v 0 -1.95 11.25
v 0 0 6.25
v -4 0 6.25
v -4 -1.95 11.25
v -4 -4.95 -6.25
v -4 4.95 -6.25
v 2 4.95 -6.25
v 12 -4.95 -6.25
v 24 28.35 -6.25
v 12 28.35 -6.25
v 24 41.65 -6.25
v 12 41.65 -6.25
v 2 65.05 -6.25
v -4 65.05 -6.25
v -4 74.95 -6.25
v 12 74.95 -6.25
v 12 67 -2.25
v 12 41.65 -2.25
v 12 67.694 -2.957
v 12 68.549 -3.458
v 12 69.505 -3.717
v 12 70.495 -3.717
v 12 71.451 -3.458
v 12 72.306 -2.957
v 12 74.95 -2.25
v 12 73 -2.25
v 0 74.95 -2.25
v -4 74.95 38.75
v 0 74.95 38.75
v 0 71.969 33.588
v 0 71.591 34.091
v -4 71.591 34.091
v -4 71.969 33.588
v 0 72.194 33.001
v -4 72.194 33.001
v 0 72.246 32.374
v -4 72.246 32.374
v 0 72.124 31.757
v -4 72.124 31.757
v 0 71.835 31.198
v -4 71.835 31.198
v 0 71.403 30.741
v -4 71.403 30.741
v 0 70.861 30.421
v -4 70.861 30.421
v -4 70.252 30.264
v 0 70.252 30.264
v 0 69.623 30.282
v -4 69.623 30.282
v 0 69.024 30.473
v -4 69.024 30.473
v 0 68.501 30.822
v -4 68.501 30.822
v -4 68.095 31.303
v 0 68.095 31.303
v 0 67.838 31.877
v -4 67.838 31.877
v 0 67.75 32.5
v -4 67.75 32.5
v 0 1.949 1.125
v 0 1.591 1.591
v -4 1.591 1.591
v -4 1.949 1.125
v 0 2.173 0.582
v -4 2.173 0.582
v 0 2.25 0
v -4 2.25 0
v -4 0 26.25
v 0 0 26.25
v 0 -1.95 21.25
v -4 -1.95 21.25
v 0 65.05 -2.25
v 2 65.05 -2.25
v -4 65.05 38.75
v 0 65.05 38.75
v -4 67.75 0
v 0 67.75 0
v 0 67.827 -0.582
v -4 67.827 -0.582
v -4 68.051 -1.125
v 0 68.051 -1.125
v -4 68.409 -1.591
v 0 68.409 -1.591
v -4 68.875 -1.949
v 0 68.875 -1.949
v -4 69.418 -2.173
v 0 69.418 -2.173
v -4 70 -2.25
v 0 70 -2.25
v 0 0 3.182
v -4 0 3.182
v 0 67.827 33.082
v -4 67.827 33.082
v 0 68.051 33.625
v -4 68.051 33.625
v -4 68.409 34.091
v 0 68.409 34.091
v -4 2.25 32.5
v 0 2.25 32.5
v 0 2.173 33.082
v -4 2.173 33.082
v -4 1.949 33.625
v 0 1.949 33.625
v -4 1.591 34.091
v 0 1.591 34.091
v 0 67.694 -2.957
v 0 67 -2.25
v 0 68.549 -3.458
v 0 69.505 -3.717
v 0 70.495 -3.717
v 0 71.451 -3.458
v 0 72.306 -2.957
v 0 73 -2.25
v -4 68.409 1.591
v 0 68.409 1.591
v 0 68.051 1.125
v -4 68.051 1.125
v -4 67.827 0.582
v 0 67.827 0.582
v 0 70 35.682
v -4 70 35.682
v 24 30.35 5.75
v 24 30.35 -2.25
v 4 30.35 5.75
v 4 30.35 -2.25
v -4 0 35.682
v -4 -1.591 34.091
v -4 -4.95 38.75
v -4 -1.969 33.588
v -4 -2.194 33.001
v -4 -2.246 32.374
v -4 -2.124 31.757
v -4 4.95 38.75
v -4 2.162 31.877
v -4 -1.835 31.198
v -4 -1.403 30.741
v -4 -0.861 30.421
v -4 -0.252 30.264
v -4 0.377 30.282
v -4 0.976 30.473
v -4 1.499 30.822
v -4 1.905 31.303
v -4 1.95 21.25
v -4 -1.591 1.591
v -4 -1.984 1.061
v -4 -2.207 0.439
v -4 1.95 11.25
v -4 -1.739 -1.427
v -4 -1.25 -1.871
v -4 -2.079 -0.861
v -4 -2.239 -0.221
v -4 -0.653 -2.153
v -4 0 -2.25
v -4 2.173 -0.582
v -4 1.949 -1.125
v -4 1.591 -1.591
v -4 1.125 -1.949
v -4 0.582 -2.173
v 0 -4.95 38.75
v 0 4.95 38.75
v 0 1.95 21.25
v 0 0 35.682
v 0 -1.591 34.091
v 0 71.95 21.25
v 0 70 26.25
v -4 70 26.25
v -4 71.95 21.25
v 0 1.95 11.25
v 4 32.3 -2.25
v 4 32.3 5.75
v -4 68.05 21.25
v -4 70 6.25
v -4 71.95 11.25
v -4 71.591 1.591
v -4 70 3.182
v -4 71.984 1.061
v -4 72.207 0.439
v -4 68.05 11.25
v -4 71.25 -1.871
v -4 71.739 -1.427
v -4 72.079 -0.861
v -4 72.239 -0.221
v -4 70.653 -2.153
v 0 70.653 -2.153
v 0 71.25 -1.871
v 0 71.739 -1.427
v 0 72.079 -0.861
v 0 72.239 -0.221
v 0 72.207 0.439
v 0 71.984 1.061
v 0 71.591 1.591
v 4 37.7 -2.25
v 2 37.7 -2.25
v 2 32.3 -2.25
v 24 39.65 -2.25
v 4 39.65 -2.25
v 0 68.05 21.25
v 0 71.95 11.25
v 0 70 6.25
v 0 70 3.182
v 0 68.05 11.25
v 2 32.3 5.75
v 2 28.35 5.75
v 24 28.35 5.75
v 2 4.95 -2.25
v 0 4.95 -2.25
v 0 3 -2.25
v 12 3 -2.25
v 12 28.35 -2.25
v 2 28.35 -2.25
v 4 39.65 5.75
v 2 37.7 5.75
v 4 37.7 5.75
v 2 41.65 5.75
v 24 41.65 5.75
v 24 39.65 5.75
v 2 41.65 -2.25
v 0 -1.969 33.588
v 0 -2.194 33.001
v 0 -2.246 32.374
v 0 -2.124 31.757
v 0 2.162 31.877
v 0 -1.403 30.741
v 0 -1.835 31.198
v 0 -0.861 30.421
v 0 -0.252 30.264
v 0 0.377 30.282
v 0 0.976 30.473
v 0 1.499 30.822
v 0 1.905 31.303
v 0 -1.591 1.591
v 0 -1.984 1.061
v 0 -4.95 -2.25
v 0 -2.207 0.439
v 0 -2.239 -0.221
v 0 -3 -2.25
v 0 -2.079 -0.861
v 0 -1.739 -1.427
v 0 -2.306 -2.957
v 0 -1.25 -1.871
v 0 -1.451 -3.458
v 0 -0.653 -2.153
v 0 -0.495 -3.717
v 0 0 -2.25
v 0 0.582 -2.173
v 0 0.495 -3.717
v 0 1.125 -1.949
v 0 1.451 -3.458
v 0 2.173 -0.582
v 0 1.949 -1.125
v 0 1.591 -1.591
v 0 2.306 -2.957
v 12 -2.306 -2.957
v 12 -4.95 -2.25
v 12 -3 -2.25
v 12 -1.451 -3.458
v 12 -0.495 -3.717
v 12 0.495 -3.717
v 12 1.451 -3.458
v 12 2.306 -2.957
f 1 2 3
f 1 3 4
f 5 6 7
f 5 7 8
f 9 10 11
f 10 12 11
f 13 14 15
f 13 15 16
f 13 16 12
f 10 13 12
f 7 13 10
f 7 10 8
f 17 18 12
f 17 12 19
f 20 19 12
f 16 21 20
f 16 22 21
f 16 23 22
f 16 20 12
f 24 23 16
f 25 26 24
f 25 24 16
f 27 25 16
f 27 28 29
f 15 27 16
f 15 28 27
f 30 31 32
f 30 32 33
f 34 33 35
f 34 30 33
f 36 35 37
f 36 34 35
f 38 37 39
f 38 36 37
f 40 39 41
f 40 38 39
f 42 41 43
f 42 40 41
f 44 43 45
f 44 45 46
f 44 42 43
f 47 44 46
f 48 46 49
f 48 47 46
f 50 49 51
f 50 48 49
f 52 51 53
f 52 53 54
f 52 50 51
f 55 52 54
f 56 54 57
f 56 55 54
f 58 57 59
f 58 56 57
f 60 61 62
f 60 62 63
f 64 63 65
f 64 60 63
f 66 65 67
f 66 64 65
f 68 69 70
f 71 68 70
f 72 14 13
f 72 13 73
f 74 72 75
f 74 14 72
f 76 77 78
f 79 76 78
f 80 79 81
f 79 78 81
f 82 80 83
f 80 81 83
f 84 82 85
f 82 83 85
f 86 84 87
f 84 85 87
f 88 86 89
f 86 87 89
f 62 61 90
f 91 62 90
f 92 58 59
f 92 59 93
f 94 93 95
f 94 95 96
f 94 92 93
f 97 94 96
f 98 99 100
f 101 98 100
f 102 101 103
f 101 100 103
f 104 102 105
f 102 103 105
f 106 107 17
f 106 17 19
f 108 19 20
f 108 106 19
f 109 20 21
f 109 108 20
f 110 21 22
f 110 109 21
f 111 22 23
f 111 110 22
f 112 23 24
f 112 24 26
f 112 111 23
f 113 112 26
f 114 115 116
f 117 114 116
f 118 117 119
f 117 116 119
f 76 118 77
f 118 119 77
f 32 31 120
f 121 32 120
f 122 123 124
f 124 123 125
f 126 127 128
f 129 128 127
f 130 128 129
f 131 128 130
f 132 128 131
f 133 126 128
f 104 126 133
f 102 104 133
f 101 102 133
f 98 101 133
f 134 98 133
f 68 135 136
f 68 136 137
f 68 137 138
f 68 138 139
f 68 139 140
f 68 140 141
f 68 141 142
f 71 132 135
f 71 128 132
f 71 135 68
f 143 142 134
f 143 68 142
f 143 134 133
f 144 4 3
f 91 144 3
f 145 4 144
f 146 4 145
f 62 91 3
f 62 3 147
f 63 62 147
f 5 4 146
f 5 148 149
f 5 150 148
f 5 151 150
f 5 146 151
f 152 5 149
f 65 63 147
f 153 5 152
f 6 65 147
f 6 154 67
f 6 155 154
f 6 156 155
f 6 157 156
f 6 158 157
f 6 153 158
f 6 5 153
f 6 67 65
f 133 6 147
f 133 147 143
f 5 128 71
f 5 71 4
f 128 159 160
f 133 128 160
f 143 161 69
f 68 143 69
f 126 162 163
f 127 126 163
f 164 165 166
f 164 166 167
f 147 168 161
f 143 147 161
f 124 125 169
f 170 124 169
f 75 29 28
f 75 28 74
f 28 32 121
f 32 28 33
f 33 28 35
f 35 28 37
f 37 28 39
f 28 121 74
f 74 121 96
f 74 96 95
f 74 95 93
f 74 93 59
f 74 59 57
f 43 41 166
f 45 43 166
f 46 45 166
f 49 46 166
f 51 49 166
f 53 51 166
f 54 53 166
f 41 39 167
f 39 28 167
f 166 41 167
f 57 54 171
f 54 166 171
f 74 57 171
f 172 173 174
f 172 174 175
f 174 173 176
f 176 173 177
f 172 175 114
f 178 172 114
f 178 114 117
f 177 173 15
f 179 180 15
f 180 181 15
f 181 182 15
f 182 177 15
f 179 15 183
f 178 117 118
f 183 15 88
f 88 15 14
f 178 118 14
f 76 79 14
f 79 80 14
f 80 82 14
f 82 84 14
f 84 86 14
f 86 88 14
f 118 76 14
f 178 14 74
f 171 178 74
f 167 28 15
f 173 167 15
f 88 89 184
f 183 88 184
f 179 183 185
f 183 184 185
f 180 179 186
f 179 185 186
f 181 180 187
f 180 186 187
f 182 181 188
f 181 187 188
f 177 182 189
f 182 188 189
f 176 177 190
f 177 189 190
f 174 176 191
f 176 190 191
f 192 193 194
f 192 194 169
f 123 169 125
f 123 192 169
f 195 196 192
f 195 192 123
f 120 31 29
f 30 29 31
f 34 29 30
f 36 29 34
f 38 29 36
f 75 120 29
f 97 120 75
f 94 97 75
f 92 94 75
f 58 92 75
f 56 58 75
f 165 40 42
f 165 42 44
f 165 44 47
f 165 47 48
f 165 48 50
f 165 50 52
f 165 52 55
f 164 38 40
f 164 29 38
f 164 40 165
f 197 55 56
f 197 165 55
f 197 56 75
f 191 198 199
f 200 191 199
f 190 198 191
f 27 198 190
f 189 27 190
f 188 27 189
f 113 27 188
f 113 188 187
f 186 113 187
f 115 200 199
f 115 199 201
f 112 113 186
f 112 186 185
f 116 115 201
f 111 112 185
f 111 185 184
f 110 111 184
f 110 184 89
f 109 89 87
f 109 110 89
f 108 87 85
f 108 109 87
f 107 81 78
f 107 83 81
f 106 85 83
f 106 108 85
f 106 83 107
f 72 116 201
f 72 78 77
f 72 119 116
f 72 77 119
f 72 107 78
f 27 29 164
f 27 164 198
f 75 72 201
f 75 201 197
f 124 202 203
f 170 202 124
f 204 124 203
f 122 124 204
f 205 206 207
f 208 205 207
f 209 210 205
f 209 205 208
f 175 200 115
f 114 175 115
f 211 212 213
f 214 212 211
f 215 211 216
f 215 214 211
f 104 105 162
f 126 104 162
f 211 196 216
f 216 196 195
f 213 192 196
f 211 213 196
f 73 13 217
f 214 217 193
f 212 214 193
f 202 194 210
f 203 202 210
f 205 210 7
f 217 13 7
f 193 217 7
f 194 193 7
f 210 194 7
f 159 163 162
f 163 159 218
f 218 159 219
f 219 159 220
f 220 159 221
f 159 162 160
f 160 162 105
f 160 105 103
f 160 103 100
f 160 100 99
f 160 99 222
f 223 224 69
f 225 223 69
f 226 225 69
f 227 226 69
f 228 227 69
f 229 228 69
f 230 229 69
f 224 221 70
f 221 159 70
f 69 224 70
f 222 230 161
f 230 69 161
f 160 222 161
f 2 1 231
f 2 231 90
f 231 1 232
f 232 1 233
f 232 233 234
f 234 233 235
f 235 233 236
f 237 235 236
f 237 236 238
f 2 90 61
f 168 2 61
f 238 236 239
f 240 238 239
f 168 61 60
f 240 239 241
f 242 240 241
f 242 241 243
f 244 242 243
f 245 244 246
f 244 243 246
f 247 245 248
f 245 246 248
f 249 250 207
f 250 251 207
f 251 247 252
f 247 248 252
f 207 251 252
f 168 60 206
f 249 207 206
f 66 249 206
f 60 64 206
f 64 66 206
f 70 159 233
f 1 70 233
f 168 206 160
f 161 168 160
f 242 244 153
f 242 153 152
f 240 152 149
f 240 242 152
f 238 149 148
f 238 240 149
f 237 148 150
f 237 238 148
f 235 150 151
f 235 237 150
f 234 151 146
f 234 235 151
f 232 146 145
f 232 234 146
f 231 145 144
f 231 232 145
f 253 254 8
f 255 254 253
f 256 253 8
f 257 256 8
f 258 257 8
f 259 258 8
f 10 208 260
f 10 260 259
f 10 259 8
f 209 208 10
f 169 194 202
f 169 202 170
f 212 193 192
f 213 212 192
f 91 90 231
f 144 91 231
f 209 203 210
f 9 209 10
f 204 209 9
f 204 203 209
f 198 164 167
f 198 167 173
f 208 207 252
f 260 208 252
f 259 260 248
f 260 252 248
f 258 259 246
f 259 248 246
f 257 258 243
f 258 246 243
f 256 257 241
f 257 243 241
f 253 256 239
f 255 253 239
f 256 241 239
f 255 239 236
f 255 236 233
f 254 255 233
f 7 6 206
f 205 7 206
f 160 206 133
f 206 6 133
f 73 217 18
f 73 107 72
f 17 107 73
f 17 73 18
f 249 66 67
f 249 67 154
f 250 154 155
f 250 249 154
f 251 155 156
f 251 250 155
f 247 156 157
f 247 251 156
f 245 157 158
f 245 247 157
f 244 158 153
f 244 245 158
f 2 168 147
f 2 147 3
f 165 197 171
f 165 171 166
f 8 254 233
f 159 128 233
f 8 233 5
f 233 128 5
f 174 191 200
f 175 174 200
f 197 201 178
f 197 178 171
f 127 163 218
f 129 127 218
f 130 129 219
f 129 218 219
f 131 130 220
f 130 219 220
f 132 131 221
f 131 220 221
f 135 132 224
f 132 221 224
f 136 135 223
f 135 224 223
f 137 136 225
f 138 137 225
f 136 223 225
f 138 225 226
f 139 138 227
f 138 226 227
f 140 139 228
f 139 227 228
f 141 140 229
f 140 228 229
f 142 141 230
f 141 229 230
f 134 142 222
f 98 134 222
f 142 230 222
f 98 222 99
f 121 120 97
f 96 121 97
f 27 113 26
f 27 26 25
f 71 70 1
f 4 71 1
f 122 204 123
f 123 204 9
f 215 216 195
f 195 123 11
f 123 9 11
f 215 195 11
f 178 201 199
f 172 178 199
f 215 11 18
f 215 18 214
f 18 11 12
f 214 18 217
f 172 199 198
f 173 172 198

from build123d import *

# Parameters (mm, degrees)
F1_DEPTH  = 4
F2_DEPTH  = 12
F7_W      = 2
F7_H      = 2
F7_H_2    = 1.95
F8_DEPTH  = 4
F9_DEPTH  = 8
F11_DEPTH = 4


with BuildPart() as f1:
    # F0 (on Right) → F1 (new body)
    with BuildSketch(Plane.YZ):
        with BuildLine():
            Line((4.95, 0), (4.95, 6.25))
            Line((4.95, 6.25), (1.95, 6.25))
            Line((1.95, 6.25), (0, 6.25))
            Line((0, 6.25), (-1.95, 6.25))
            Line((-1.95, 6.25), (-4.95, 6.25))
            Line((-4.95, 6.25), (-4.95, -2.25))
            Line((-4.95, -2.25), (-3, -2.25))
            ThreePointArc((-3, -2.25), (-1.1858541226, 3.5575623677), (3.75, 0))
            Line((3.75, 0), (4.95, 0))
        make_face()
        Polygon((-4.95, 6.25), (-1.95, 6.25), (-1.95, 11.25), (-1.95, 16.25), (-4.95, 16.25), align=None)
        Polygon((1.95, 6.25), (4.95, 6.25), (4.95, 16.25), (1.95, 16.25), (1.95, 11.25), align=None)
        with BuildLine():
            Line((4.95, -6.25), (4.95, -2.25))
            Line((4.95, -2.25), (3, -2.25))
            ThreePointArc((3, -2.25), (0, -3.75), (-3, -2.25))
            Line((-3, -2.25), (-4.95, -2.25))
            Line((-4.95, -2.25), (-4.95, -6.25))
            Line((-4.95, -6.25), (4.95, -6.25))
        make_face()
        with BuildLine():
            Line((4.95, -2.25), (4.95, 0))
            Line((4.95, 0), (3.75, 0))
            ThreePointArc((3.75, 0), (3.5575623677, -1.1858541226), (3, -2.25))
            Line((3, -2.25), (4.95, -2.25))
        make_face()
        with BuildLine():
            ThreePointArc((-3, -2.25), (0, -3.75), (3, -2.25))
            Line((3, -2.25), (0, -2.25))
            Line((0, -2.25), (-3, -2.25))
        make_face()
        with BuildLine():
            Line((2.25, 0), (3.75, 0))
            ThreePointArc((3.75, 0), (-1.1858541226, 3.5575623677), (-3, -2.25))
            Line((-3, -2.25), (0, -2.25))
            ThreePointArc((0, -2.25), (-1.5909902577, 1.5909902577), (2.25, 0))
        make_face()
        with BuildLine():
            ThreePointArc((3, -2.25), (3.5575623677, -1.1858541226), (3.75, 0))
            Line((3.75, 0), (2.25, 0))
            ThreePointArc((2.25, 0), (1.5909902577, -1.5909902577), (0, -2.25))
            Line((0, -2.25), (3, -2.25))
        make_face()
        Polygon((-1.95, 6.25), (0, 6.25), (-1.95, 11.25), align=None)
        Polygon((0, 6.25), (1.95, 6.25), (1.95, 11.25), align=None)
    extrude(amount=-F1_DEPTH)

    # F4: F1 across plane


with BuildPart() as f2:
    # F0 (on Right) → F2 (new body)
    with BuildSketch(Plane.YZ):
        with BuildLine():
            Line((4.95, -6.25), (4.95, -2.25))
            Line((4.95, -2.25), (3, -2.25))
            ThreePointArc((3, -2.25), (0, -3.75), (-3, -2.25))
            Line((-3, -2.25), (-4.95, -2.25))
            Line((-4.95, -2.25), (-4.95, -6.25))
            Line((-4.95, -6.25), (4.95, -6.25))
        make_face()
    extrude(amount=F2_DEPTH)


with BuildPart() as f1_1:
    add(f1.part)
    add(f1.part.mirror(Plane(origin=(-2, 3.45, 16.25), x_dir=(1, 0, 0), z_dir=(0, 0, 1))))


with BuildPart() as f6_1:
    # F6: instance of F1
    add(f1_1.part.mirror(Plane(origin=(0, 35, 0), x_dir=(-1, 0, 0), z_dir=(0, 1, 0))))


with BuildPart() as f6_2:
    # F6: instance of F2
    add(f2.part.mirror(Plane(origin=(0, 35, 0), x_dir=(-1, 0, 0), z_dir=(0, 1, 0))))


with BuildPart() as f8:
    # F7 (on face) → F8 (new body)
    with BuildSketch(Plane.XY.offset(-2.25)):
        Polygon((2, 28.35), (2, 4.95), (12, 4.95), (12, 28.35), (4, 28.35), align=None)
        Polygon((4, 30.35), (4, 28.35), (12, 28.35), (24, 28.35), (24, 30.35), align=None)
        with Locations((3, 29.35)):
            Rectangle(F7_W, F7_H)
        with Locations((3, 31.325)):
            Rectangle(F7_W, F7_H_2)
        with Locations((3, 38.675)):
            Rectangle(F7_W, F7_H_2)
        with Locations((3, 40.65)):
            Rectangle(F7_W, F7_H)
        Polygon((4, 39.65), (24, 39.65), (24, 41.65), (12, 41.65), (4, 41.65), align=None)
        Polygon((2, 65.05), (2, 41.65), (4, 41.65), (12, 41.65), (12, 65.05), align=None)
        Polygon((4, 32.3), (4, 30.35), (24, 30.35), (24, 39.65), (4, 39.65), (4, 37.7), align=None)
        Polygon((2, 35), (2, 32.3), (4, 32.3), (4, 37.7), (2, 37.7), align=None)
    extrude(amount=-F8_DEPTH)


with BuildPart() as f1_2:
    add(f1_1.part)

    add(f2.part)  # F9 merges F2

    add(f6_1.part)  # F9 merges F6_1

    add(f6_2.part)  # F9 merges F6_2

    add(f8.part)  # F9 merges F8
    # F7 (on face) → F9 (join)
    with BuildSketch(Plane.XY.offset(-2.25)):
        Polygon((4, 39.65), (24, 39.65), (24, 41.65), (12, 41.65), (4, 41.65), align=None)
        with Locations((3, 40.65)):
            Rectangle(F7_W, F7_H)
        with Locations((3, 38.675)):
            Rectangle(F7_W, F7_H_2)
        with Locations((3, 31.325)):
            Rectangle(F7_W, F7_H_2)
        with Locations((3, 29.35)):
            Rectangle(F7_W, F7_H)
        Polygon((4, 30.35), (4, 28.35), (12, 28.35), (24, 28.35), (24, 30.35), align=None)
    extrude(amount=F9_DEPTH)

    # F10 (on Right) → F11 (cut)
    with BuildSketch(Plane.YZ):
        with BuildLine():
            ThreePointArc((0, 34.75), (0.8610377228, 34.5787289482), (1.5909902577, 34.0909902577))
            Line((1.5909902577, 34.0909902577), (0, 35.6819805153))
            Line((0, 35.6819805153), (-1.5909902577, 34.0909902577))
            ThreePointArc((-1.5909902577, 34.0909902577), (-0.8610377228, 34.5787289482), (0, 34.75))
        make_face()
        with BuildLine():
            ThreePointArc((-1.5909902577, 1.5909902577), (-0.8610377228, 2.0787289482), (0, 2.25))
            ThreePointArc((0, 2.25), (0.8610377228, 2.0787289482), (1.5909902577, 1.5909902577))
            Line((1.5909902577, 1.5909902577), (0, 3.1819805153))
            Line((0, 3.1819805153), (-1.5909902577, 1.5909902577))
        make_face()
        with BuildLine():
            ThreePointArc((70, 2.25), (70.8610377228, 2.0787289482), (71.5909902577, 1.5909902577))
            Line((71.5909902577, 1.5909902577), (70, 3.1819805153))
            Line((70, 3.1819805153), (68.4090097423, 1.5909902577))
            ThreePointArc((68.4090097423, 1.5909902577), (69.1389622772, 2.0787289482), (70, 2.25))
        make_face()
        with BuildLine():
            ThreePointArc((70, 34.75), (70.8610377228, 34.5787289482), (71.5909902577, 34.0909902577))
            Line((71.5909902577, 34.0909902577), (70, 35.6819805153))
            Line((70, 35.6819805153), (68.4090097423, 34.0909902577))
            ThreePointArc((68.4090097423, 34.0909902577), (69.1389622772, 34.5787289482), (70, 34.75))
        make_face()
    extrude(amount=-F11_DEPTH, mode=Mode.SUBTRACT)


solid = f1_2.part
